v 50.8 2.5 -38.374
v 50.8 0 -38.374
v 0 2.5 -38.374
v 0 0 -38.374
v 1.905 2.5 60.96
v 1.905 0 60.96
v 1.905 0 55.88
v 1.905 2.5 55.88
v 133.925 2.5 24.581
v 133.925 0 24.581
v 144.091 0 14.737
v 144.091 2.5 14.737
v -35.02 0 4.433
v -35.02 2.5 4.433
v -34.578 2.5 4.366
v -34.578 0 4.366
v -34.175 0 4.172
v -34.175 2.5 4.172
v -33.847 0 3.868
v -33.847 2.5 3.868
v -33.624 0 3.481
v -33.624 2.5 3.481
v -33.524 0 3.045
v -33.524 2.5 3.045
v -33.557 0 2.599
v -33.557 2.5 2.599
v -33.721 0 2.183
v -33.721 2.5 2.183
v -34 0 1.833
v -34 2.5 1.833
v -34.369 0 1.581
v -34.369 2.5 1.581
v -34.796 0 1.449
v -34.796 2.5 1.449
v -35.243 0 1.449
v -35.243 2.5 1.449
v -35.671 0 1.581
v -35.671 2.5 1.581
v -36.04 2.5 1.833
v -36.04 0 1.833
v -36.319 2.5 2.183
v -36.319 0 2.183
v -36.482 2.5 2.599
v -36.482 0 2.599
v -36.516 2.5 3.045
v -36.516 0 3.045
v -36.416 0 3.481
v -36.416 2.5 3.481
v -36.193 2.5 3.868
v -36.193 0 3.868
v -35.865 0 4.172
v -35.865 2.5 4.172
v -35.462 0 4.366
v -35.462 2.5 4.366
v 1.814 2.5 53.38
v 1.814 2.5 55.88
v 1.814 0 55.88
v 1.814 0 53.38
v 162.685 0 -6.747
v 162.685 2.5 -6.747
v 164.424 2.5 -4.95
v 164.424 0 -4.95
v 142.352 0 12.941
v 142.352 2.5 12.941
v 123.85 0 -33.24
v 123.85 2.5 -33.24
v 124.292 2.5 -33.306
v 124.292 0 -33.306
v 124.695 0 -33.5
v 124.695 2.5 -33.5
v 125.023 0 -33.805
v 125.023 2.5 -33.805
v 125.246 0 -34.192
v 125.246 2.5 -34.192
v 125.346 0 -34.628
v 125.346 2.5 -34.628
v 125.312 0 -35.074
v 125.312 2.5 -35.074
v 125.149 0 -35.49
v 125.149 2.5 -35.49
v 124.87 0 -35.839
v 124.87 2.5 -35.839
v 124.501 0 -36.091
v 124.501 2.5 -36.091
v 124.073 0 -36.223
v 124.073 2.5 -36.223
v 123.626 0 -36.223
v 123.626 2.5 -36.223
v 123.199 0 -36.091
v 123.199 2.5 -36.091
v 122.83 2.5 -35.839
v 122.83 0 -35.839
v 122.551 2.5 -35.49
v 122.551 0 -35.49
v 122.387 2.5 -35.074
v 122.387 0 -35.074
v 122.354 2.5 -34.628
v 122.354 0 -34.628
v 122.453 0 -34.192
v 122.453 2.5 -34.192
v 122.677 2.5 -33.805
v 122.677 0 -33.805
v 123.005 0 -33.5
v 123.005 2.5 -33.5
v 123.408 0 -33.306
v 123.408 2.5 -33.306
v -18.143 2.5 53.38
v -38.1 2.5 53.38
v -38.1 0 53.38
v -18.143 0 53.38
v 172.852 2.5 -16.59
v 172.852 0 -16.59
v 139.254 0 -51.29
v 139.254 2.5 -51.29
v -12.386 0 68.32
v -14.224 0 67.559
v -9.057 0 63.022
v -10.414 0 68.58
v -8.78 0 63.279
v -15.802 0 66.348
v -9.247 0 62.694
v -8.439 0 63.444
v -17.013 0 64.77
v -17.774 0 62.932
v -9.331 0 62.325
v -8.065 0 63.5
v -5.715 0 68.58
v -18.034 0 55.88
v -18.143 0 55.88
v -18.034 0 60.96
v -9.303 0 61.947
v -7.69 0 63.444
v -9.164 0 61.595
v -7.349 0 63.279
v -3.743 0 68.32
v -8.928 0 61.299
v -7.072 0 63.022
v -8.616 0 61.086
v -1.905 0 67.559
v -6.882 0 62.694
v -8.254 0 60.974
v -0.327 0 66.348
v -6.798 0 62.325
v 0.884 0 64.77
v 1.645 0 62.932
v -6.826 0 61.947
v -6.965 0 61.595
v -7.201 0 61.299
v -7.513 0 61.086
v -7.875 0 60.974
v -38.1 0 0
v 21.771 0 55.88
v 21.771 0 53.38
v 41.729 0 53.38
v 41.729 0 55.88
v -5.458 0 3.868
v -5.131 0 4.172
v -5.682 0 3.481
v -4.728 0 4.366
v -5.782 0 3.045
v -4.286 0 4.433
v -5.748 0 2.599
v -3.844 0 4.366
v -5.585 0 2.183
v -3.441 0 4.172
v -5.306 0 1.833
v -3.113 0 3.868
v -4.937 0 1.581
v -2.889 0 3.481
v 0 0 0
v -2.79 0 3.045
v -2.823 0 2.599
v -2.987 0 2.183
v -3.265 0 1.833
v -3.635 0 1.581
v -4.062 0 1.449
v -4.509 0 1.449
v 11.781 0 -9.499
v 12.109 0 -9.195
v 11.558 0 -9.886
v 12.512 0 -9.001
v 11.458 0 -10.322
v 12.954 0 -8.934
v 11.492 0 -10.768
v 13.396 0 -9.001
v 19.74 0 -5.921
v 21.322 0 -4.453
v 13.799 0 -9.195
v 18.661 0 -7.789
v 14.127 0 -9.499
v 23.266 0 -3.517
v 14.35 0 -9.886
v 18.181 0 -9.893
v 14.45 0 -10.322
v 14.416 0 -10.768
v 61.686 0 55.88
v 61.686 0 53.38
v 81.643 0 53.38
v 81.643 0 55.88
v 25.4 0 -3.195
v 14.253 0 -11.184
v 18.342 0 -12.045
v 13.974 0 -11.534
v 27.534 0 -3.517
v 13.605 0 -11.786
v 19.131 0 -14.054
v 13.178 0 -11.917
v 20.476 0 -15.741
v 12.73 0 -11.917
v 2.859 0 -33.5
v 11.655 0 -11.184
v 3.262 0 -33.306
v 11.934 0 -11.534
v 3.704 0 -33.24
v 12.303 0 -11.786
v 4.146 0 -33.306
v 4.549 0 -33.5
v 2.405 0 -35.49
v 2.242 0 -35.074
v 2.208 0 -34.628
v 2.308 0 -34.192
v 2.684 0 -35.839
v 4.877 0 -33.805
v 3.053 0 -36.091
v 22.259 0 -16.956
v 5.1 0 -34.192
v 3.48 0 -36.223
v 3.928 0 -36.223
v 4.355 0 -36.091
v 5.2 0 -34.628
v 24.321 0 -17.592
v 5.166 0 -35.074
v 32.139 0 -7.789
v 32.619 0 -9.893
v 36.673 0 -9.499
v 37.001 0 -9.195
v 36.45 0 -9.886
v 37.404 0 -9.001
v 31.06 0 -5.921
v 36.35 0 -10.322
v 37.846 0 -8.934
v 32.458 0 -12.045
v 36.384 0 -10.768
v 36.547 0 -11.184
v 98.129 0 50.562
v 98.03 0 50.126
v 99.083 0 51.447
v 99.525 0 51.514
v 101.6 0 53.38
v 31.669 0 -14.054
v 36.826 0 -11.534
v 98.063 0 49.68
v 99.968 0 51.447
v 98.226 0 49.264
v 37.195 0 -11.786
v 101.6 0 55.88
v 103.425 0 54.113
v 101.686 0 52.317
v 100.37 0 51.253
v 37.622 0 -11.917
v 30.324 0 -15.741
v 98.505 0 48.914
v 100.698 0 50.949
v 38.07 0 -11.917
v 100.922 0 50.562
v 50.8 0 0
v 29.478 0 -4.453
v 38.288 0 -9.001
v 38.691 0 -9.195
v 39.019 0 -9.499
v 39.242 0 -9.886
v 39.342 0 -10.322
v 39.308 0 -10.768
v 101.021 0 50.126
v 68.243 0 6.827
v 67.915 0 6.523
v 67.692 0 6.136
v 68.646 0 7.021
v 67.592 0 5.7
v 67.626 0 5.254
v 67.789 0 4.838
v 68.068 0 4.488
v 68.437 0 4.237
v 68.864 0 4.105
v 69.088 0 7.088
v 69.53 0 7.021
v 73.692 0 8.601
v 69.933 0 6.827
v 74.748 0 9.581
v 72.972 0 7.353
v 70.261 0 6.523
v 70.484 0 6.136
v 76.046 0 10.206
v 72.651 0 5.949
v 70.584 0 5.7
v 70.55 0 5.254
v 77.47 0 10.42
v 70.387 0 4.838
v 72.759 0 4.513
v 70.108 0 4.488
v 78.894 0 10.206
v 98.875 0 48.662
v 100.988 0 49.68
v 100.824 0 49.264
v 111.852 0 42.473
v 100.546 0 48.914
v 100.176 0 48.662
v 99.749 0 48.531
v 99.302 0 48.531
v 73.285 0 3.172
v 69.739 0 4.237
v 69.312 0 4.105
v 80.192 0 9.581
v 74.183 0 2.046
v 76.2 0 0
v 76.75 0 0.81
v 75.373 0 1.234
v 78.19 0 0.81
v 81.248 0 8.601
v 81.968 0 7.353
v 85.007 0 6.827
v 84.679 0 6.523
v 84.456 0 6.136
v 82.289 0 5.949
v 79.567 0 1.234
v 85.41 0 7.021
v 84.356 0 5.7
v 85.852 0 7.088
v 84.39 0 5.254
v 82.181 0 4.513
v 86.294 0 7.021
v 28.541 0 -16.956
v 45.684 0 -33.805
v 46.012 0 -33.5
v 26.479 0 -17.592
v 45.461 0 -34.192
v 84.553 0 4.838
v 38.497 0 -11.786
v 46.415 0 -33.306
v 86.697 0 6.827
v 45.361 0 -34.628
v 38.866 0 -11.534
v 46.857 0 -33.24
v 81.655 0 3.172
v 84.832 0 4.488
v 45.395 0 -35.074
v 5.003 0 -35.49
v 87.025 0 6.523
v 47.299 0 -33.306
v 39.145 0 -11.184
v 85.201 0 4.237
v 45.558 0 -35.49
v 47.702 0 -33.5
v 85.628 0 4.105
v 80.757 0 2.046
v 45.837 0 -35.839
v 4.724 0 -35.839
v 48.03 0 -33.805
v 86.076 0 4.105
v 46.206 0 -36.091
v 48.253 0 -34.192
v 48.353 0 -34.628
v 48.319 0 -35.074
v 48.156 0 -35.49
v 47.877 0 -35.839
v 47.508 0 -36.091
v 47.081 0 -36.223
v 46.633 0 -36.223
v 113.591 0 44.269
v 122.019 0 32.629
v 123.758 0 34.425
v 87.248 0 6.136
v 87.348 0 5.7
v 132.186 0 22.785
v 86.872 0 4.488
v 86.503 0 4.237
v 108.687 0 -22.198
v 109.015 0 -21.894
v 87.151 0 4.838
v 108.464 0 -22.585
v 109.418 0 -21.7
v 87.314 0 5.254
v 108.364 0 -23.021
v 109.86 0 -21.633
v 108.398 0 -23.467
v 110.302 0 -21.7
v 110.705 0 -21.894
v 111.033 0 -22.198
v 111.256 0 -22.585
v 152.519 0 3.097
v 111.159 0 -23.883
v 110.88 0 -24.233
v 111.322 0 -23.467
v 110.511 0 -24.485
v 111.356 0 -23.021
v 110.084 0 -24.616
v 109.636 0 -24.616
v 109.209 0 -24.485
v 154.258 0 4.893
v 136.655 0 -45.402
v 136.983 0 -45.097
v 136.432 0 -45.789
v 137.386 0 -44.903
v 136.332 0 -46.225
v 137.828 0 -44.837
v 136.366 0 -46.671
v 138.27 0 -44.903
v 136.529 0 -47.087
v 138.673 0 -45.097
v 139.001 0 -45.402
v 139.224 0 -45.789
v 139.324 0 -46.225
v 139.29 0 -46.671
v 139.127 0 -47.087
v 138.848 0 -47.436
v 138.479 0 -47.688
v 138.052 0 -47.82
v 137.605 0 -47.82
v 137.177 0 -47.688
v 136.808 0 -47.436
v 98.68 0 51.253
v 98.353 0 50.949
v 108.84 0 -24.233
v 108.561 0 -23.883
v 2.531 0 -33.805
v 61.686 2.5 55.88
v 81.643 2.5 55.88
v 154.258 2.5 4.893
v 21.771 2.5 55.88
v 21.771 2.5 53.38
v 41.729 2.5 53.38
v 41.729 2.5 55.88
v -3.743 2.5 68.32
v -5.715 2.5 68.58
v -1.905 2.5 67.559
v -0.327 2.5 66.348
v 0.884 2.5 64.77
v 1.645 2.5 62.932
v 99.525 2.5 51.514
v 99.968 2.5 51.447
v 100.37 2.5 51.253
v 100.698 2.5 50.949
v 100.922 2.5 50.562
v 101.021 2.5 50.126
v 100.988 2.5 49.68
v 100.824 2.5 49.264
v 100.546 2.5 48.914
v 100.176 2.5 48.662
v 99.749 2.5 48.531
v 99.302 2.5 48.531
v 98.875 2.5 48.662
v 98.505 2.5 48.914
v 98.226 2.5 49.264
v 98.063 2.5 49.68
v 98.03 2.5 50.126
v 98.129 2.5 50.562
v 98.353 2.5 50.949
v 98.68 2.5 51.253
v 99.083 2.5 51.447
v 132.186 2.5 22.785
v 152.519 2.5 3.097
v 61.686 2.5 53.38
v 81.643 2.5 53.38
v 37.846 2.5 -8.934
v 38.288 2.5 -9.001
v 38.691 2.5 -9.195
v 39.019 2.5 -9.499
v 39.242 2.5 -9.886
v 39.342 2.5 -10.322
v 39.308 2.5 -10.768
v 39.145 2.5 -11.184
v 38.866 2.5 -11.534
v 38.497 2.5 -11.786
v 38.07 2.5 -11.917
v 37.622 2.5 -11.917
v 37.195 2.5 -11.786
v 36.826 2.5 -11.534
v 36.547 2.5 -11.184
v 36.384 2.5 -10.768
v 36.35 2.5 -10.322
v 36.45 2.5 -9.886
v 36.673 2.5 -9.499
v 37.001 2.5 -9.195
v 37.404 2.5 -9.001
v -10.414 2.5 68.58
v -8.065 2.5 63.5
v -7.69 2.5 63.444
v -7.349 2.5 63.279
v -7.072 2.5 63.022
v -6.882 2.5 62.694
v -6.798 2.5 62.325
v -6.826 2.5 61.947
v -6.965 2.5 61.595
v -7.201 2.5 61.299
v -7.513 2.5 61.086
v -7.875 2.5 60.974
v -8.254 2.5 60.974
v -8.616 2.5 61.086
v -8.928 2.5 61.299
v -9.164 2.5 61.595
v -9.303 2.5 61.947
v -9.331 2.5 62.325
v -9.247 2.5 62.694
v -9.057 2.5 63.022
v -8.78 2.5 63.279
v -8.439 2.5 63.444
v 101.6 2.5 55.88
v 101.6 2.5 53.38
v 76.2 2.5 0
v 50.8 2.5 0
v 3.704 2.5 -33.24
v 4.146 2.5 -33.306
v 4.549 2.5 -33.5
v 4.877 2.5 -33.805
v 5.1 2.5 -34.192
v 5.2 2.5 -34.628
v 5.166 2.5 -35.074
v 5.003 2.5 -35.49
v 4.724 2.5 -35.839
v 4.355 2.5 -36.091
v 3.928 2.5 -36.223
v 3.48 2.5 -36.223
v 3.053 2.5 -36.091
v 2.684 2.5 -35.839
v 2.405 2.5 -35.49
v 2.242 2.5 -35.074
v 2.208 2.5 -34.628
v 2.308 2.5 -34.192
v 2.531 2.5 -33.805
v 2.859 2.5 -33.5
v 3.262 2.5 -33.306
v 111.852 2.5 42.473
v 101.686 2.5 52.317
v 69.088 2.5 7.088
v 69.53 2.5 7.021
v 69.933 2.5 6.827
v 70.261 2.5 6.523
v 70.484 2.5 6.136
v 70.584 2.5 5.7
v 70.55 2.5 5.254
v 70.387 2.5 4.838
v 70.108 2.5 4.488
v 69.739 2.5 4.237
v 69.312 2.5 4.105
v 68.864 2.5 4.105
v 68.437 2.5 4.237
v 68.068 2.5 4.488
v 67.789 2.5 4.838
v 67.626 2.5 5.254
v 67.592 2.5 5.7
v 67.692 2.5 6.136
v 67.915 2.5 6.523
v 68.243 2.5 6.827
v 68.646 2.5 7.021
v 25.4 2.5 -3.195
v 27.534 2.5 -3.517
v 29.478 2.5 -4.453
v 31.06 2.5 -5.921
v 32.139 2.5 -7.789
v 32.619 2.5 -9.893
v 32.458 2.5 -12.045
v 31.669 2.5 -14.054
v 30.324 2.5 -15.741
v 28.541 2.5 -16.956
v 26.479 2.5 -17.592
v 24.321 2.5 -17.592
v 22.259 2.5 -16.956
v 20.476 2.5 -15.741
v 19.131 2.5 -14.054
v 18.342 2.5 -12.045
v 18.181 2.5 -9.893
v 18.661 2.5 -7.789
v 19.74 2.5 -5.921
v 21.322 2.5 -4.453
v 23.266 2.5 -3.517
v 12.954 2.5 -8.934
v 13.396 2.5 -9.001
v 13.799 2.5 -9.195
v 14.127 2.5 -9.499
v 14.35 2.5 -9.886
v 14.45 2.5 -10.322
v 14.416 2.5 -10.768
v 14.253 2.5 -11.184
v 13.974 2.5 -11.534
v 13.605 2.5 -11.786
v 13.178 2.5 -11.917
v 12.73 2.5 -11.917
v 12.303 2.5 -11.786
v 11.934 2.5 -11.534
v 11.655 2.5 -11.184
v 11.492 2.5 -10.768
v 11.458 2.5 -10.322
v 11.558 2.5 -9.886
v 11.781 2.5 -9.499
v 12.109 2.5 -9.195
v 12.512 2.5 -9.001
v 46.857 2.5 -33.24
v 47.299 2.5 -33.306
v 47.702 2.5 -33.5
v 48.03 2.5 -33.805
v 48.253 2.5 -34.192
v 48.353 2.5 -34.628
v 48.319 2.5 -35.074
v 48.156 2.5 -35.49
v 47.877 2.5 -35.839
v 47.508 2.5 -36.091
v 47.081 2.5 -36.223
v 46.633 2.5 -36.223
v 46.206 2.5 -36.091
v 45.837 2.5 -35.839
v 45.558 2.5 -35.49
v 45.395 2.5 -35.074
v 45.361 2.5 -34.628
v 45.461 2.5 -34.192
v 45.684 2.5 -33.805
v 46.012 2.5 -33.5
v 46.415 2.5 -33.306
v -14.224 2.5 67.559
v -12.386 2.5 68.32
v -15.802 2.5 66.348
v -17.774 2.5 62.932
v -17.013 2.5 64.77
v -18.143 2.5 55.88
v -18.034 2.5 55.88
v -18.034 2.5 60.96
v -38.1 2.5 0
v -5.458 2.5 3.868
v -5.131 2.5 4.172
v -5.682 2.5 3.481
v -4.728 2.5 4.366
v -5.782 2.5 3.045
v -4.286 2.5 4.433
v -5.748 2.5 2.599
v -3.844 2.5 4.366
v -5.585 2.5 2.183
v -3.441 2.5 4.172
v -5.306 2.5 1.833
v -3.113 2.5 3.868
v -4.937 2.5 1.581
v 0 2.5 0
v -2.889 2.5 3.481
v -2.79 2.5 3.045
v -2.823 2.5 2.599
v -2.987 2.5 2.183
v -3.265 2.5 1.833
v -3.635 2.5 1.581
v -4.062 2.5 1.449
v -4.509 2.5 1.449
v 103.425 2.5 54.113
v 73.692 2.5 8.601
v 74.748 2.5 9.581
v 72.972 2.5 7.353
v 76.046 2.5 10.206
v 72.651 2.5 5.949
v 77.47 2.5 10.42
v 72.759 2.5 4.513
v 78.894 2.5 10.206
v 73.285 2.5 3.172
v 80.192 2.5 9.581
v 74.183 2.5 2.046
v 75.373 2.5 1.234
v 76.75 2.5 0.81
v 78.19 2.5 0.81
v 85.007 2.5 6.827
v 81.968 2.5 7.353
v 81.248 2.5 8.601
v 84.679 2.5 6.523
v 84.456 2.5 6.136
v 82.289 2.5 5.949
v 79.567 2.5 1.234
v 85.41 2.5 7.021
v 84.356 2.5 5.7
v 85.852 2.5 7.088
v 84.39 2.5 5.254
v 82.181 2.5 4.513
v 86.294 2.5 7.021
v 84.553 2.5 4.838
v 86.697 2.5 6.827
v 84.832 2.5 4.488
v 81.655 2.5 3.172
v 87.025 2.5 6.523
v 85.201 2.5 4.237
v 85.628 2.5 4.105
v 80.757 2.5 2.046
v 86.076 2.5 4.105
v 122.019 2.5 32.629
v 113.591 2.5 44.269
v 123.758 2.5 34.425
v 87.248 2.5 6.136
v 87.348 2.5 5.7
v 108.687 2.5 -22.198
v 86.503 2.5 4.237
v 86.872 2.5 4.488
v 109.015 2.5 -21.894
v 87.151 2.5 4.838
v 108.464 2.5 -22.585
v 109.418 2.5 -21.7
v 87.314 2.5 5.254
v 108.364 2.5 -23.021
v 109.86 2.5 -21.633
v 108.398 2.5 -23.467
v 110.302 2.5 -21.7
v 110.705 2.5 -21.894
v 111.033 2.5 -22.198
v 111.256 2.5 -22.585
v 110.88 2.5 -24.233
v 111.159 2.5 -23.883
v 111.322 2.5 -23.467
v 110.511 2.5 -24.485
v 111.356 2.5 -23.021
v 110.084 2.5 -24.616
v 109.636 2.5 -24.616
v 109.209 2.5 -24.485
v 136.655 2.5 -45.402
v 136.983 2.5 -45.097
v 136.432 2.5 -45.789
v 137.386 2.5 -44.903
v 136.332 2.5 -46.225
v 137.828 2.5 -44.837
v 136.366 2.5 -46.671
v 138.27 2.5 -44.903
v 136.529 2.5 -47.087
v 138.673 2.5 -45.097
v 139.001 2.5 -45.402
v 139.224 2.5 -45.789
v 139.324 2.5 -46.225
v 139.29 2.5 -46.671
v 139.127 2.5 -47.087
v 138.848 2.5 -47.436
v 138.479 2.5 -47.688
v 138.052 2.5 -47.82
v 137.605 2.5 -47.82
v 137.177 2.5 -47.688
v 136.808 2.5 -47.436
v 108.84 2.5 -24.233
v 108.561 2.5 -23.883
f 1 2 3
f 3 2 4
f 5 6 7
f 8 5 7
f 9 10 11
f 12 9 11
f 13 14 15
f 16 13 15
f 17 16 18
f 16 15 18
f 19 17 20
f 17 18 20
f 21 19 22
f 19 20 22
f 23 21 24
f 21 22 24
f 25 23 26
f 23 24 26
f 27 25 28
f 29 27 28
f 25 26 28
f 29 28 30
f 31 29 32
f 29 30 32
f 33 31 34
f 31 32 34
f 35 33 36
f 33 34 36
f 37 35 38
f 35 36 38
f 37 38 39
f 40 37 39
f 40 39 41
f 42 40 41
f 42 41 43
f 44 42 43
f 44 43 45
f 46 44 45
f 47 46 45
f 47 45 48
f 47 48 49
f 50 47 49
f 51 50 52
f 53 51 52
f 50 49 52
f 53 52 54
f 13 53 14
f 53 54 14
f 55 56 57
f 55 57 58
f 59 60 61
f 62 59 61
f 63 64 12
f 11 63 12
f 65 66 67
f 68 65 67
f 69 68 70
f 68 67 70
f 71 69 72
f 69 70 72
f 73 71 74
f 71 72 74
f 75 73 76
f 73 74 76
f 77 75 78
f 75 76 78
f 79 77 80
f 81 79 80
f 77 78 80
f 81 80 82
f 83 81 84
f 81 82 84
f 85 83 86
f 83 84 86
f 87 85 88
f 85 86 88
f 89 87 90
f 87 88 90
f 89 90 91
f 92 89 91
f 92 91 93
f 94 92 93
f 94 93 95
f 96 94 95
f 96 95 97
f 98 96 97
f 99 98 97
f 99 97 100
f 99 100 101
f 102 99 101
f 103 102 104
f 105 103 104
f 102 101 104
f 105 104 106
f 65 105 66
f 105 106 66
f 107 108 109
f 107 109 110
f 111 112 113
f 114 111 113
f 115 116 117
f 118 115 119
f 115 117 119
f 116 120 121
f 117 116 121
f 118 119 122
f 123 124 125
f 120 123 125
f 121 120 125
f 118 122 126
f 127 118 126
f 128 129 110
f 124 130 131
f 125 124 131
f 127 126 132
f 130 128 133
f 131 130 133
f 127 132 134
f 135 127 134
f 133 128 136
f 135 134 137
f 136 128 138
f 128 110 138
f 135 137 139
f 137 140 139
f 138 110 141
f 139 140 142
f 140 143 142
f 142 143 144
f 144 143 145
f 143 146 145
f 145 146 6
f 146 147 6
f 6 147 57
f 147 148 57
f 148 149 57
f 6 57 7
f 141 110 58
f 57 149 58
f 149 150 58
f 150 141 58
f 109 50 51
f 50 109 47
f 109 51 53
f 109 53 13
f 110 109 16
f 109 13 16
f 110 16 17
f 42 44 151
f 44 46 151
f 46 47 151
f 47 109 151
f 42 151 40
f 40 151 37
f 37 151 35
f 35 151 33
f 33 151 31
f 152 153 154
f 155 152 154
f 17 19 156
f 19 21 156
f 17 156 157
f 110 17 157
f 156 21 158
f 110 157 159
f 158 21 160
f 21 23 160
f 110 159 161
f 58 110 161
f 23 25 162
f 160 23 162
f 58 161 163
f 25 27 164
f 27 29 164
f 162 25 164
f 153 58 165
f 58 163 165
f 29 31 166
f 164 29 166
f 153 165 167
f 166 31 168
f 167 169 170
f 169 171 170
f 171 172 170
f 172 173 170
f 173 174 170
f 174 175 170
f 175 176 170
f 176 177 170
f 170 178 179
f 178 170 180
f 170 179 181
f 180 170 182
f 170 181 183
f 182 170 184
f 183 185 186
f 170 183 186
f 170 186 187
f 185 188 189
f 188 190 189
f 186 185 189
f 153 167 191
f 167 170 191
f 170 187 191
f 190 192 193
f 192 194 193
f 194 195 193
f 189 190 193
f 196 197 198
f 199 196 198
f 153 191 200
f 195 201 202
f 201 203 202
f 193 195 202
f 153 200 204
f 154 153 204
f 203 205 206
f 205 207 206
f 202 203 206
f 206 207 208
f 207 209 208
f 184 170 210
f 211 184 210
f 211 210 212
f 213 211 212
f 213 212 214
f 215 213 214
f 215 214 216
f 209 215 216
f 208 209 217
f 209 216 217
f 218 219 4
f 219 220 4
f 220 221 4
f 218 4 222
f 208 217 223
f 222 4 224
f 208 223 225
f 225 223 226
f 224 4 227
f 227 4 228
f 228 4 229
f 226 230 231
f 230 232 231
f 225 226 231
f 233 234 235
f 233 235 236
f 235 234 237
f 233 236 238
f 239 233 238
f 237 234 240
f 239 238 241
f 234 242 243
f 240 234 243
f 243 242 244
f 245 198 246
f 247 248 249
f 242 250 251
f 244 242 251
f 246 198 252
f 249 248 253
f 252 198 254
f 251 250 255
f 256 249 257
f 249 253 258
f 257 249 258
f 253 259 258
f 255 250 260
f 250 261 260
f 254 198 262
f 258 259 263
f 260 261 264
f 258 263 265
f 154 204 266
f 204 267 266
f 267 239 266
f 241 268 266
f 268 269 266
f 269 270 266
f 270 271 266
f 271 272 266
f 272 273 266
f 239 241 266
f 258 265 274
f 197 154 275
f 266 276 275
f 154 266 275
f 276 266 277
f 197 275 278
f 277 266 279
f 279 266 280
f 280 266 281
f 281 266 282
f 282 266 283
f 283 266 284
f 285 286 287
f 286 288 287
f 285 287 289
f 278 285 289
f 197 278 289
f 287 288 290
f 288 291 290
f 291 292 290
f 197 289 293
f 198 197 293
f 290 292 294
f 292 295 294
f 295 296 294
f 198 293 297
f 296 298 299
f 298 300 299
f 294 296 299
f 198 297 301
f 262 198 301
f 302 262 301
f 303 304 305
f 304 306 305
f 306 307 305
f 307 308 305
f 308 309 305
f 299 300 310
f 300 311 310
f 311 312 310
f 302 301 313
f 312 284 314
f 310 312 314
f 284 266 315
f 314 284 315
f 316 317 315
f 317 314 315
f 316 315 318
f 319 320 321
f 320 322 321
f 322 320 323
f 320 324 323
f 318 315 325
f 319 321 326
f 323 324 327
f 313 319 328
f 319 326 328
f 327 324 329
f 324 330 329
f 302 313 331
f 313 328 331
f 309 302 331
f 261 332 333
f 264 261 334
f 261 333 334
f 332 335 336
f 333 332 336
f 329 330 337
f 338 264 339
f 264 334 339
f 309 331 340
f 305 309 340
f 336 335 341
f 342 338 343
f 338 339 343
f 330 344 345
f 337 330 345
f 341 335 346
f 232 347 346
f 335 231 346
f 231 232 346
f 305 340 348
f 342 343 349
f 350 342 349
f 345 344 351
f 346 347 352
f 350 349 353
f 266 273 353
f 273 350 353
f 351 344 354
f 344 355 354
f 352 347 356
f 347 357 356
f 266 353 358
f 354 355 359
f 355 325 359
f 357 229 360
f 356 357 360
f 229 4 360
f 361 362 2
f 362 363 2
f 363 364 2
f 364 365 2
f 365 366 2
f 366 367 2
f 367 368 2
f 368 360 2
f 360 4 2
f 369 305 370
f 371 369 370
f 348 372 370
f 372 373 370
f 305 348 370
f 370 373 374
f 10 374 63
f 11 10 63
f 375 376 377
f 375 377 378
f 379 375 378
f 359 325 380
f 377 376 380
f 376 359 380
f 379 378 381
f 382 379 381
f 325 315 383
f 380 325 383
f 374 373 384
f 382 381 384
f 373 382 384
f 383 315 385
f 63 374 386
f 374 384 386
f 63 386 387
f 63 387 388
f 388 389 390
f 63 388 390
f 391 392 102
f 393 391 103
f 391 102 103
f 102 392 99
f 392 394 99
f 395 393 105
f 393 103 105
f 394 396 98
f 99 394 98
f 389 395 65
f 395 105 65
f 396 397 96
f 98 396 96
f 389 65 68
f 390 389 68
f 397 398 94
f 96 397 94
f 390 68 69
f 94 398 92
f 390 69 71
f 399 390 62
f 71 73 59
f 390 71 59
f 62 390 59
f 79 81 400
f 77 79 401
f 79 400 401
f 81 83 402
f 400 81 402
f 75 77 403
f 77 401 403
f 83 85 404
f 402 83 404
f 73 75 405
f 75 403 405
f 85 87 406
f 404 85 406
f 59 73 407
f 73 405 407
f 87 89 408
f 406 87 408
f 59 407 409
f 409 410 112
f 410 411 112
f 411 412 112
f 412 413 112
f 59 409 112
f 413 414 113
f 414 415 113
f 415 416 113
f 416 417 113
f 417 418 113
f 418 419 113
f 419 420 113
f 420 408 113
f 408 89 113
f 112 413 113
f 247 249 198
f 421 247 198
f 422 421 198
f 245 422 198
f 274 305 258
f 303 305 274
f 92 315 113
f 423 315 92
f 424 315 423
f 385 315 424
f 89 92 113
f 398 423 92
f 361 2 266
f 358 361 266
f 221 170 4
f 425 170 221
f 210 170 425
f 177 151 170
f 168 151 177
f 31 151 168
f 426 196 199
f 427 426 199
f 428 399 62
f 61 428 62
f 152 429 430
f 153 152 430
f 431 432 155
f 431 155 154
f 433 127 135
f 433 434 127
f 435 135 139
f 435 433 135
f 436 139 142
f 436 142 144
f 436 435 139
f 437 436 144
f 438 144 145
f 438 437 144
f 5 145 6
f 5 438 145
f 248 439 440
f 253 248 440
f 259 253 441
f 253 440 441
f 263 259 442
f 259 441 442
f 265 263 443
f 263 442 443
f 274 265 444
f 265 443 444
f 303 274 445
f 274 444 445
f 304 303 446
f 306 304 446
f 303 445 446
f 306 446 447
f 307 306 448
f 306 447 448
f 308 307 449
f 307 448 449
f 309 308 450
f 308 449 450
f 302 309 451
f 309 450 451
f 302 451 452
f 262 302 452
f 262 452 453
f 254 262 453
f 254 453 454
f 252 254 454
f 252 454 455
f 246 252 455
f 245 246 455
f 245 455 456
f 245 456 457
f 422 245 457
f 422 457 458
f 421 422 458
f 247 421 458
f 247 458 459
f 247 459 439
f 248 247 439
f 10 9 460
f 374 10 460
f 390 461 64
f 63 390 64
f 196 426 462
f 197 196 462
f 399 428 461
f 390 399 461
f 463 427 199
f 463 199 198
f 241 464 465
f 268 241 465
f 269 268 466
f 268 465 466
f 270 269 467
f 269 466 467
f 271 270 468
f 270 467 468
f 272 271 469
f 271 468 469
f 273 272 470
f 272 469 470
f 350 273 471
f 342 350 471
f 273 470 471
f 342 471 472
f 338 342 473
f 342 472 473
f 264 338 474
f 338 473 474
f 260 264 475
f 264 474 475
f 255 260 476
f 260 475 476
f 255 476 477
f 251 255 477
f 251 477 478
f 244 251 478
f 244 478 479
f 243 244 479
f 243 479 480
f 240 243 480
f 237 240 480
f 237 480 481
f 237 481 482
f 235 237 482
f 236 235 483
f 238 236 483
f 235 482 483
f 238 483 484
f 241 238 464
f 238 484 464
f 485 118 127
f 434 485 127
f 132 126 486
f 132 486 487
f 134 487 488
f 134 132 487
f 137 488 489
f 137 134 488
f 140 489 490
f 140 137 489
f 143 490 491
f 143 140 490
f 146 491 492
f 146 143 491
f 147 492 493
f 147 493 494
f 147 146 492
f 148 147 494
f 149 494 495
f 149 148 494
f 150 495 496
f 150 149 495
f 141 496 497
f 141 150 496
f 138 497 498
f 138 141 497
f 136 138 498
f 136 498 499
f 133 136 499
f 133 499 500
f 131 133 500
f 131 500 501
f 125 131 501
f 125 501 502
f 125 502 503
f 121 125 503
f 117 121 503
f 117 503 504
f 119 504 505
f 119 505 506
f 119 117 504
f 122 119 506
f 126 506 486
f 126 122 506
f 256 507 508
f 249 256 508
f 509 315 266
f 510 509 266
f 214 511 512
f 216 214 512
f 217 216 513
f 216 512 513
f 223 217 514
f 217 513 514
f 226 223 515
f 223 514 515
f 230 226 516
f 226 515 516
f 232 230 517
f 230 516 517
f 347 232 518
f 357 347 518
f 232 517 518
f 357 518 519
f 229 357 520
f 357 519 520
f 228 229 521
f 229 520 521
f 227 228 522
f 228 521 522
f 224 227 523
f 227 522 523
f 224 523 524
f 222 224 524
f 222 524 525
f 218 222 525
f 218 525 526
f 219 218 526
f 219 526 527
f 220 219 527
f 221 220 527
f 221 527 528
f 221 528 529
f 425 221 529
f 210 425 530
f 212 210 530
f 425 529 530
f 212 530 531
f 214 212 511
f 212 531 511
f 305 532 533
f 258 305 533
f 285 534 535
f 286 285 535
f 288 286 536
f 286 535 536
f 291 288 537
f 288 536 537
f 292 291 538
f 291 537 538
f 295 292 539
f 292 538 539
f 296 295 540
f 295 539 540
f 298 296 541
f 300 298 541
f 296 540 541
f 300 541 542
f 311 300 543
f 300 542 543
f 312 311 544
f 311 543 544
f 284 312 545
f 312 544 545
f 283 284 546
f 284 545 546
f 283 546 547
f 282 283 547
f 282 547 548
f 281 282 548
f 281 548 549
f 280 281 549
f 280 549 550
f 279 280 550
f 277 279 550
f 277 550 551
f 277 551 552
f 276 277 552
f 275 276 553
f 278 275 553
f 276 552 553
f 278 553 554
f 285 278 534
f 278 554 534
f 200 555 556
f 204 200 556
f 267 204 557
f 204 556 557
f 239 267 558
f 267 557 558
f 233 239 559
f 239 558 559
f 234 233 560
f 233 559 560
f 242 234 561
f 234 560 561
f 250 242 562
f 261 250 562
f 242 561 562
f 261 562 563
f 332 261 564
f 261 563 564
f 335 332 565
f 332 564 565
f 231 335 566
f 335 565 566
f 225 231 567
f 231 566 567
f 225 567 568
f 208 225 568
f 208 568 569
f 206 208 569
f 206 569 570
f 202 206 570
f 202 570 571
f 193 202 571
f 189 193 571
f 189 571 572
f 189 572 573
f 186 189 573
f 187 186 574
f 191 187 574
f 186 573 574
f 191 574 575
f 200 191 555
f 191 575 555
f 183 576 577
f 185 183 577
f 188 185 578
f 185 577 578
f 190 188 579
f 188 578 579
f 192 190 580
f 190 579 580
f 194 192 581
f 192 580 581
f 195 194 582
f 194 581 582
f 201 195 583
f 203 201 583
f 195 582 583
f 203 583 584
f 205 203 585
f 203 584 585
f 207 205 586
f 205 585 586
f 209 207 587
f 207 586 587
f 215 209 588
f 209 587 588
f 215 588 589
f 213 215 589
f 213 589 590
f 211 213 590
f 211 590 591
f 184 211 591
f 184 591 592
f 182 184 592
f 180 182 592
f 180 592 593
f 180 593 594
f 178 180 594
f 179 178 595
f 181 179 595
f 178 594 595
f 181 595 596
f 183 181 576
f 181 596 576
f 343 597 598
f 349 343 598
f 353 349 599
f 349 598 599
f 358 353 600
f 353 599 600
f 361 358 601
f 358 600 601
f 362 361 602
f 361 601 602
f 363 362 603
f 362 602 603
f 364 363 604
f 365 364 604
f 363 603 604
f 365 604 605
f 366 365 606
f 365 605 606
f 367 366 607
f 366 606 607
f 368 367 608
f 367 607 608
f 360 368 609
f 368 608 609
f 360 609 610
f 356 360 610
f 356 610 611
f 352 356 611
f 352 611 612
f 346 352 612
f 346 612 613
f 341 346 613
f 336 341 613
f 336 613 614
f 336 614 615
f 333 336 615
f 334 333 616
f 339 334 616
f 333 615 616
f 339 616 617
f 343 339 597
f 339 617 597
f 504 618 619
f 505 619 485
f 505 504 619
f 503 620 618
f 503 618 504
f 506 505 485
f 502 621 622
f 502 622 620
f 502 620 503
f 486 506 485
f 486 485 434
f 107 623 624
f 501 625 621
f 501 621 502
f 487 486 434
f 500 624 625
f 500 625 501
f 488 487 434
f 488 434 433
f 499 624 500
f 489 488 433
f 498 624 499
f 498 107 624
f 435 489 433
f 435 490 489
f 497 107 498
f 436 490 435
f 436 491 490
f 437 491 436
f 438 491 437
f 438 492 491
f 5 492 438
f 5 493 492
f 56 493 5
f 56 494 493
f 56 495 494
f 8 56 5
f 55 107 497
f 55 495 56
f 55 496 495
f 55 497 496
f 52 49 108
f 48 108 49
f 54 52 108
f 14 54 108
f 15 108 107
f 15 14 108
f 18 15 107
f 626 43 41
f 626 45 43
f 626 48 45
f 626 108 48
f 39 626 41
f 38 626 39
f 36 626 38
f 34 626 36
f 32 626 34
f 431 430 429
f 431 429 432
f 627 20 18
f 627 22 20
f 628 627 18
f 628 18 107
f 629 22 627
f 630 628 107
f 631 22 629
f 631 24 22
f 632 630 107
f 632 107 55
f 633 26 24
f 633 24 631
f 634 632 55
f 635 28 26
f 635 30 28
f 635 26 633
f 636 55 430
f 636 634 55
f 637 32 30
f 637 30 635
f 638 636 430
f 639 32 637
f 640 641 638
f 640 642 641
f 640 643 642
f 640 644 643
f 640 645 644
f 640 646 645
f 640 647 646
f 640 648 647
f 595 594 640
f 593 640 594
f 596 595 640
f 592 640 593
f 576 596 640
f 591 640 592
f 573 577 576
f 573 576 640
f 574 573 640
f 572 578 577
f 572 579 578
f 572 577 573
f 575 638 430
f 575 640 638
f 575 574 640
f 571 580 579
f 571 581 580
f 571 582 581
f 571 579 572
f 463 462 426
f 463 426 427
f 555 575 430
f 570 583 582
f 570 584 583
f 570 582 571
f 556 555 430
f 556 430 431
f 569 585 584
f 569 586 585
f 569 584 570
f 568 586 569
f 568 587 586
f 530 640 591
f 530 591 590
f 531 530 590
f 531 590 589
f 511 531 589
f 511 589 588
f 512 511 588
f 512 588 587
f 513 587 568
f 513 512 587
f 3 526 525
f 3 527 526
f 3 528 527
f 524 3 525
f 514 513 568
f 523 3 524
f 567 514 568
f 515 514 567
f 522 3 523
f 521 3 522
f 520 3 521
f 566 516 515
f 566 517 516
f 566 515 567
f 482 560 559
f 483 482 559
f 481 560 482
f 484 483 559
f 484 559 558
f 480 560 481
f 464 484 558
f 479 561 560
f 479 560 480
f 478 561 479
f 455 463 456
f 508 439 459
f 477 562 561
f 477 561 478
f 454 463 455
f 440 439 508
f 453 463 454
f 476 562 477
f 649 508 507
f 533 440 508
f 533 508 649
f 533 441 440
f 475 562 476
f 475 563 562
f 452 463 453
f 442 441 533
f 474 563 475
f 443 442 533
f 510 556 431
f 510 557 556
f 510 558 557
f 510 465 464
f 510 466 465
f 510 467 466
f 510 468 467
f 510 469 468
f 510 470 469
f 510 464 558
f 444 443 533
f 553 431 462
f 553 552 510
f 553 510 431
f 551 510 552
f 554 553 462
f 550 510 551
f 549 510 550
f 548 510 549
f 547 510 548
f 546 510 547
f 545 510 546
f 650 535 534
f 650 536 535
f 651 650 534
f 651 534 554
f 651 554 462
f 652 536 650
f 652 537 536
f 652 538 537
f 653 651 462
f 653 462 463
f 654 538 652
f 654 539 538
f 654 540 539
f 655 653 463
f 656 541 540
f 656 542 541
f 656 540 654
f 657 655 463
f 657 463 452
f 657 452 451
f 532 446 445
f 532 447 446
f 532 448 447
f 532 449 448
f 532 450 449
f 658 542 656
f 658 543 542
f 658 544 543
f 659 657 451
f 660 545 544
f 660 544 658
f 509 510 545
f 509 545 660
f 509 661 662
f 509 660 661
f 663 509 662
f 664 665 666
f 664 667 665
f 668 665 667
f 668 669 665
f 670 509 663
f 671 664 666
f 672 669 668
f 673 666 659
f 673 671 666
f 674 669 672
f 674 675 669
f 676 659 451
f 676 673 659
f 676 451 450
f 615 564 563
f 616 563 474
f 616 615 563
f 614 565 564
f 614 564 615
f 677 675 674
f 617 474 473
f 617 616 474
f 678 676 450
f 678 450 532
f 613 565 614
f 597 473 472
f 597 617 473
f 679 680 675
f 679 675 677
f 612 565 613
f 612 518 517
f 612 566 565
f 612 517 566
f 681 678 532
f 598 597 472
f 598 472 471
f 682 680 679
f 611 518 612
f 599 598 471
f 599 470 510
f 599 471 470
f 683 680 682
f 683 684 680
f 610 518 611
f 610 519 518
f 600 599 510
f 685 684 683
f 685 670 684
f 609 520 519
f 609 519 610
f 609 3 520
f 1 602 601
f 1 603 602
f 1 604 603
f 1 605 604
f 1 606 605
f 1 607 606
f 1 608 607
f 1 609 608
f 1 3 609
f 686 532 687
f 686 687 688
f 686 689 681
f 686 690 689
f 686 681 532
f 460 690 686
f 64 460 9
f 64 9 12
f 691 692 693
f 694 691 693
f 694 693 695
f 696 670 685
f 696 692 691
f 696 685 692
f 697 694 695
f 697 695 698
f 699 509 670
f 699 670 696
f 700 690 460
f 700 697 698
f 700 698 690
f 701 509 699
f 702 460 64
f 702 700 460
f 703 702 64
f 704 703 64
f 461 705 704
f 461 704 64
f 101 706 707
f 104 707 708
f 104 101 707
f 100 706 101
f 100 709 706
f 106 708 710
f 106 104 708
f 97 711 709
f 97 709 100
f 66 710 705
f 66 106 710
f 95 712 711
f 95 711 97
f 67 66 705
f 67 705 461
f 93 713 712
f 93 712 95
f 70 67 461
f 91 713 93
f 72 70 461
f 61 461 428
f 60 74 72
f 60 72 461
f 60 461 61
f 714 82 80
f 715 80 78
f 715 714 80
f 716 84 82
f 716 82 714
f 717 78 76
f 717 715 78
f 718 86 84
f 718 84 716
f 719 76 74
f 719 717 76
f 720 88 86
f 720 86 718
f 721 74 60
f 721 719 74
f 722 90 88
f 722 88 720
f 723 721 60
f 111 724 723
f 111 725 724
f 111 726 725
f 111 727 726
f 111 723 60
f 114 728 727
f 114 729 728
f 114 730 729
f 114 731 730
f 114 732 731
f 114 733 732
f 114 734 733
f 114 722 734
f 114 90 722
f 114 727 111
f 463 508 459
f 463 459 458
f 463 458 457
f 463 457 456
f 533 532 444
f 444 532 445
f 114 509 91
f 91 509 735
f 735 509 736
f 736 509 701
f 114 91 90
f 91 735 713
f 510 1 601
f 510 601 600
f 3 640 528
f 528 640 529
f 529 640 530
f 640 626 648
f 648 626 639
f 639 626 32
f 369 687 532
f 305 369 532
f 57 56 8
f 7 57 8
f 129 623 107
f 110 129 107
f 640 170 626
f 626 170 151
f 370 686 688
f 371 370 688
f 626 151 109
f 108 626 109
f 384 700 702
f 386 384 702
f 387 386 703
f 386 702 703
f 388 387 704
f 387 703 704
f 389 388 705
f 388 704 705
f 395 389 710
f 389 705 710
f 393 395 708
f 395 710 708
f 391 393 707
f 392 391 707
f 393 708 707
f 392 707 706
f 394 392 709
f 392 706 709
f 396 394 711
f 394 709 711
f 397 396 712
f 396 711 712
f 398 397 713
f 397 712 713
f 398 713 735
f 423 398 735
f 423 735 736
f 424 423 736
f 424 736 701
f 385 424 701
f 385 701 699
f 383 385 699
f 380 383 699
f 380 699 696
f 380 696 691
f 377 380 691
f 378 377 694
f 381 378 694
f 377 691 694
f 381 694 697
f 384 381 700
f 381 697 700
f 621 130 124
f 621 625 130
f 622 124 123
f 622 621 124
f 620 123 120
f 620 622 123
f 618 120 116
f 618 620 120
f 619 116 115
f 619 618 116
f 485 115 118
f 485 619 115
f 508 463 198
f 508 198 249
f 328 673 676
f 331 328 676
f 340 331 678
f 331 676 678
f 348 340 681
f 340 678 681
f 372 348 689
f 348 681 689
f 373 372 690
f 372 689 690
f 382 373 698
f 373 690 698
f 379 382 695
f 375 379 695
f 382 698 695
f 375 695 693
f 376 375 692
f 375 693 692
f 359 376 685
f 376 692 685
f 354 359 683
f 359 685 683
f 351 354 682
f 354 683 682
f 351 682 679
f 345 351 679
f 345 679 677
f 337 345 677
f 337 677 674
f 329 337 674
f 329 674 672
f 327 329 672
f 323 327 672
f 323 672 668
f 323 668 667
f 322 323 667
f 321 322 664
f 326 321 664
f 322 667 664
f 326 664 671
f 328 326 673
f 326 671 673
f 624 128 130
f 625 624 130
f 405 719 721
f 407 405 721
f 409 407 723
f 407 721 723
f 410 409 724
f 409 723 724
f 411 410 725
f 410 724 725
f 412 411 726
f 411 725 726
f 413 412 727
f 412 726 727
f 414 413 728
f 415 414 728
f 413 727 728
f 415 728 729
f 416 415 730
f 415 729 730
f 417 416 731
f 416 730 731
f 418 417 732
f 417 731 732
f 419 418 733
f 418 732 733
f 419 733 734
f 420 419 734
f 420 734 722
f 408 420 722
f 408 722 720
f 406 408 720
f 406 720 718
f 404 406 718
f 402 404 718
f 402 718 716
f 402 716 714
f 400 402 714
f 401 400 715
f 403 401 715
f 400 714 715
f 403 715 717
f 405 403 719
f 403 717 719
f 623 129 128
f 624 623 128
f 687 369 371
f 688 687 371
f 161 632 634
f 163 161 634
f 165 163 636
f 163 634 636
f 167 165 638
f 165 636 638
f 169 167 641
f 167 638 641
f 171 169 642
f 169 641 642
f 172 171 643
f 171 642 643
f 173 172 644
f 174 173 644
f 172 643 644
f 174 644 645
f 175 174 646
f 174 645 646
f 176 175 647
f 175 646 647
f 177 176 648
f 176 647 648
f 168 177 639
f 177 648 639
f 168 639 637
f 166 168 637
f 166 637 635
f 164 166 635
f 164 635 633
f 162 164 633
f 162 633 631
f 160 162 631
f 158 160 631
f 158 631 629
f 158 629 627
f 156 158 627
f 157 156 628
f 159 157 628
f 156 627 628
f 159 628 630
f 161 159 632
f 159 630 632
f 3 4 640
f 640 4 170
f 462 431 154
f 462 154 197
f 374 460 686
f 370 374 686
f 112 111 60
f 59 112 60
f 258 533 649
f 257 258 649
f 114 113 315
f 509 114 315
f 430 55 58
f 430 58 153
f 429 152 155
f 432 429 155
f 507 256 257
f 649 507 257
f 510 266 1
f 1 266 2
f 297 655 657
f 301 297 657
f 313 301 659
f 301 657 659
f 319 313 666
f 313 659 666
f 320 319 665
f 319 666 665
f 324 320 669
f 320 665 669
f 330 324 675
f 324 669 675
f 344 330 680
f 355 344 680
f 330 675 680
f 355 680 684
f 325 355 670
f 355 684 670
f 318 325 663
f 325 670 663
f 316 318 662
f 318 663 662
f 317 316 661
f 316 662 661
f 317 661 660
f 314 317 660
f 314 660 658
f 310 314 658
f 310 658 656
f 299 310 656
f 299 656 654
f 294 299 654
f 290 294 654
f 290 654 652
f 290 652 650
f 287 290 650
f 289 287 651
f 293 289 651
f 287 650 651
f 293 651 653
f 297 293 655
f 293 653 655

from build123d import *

# Parameters (mm, degrees)
SKETCH1_R           = 1.27
BOSS_EXTRUDE1_DEPTH = 2.5
SKETCH2_W           = 19.957142857
SKETCH2_H           = 2.5
CUT_EXTRUDE1_DEPTH  = 2.5
CUT_EXTRUDE2_DEPTH  = 2.5
SKETCH4_R           = 1.5
CUT_EXTRUDE3_DEPTH  = 2.5
SKETCH5_R           = 7.239
SKETCH5_R_2         = 1.5
CUT_EXTRUDE4_DEPTH  = 2.5
SKETCH6_R           = 4.83219682
SKETCH6_R_2         = 1.5
CUT_EXTRUDE5_DEPTH  = 2.5
SKETCH7_R           = 1.5
CUT_EXTRUDE6_DEPTH  = 2.54
FILLET1_R           = 7.62


with BuildPart() as part:
    # Sketch1 → Boss-Extrude1 (new body)
    with BuildSketch(Plane(origin=(0, 0, 0), x_dir=(1, 0, 0), z_dir=(0, 1, 0))):
        Polygon((0, 0), (-38.1, 0), (-38.1, -55.88), (-18.034, -55.88), (-18.034, -68.58), (1.905, -68.58), (1.905, -55.88), (101.6, -55.88), (174.591014612, 14.794406866), (139.253811179, 51.289914172), (76.2, 0), (50.8, 0), (50.8, 38.374100719), (0, 38.374100719), align=None)
        with Locations(Location((-8.0645, -62.23, 0), (0, 0, 270))):
            Circle(SKETCH1_R, mode=Mode.SUBTRACT)
    extrude(amount=BOSS_EXTRUDE1_DEPTH)

    # Sketch2 → Cut-Extrude1 (cut)
    with BuildSketch(Plane(origin=(0, 2.5, 0), x_dir=(1, 0, 0), z_dir=(0, 1, 0))):
        with Locations((-28.121428572, -54.63)):
            Rectangle(SKETCH2_W, SKETCH2_H)
        with Locations((11.792857143, -54.63)):
            Rectangle(SKETCH2_W, SKETCH2_H)
        with Locations((51.707142858, -54.63)):
            Rectangle(SKETCH2_W, SKETCH2_H)
        with Locations((91.621428572, -54.63)):
            Rectangle(SKETCH2_W, SKETCH2_H)
    extrude(amount=-CUT_EXTRUDE1_DEPTH, mode=Mode.SUBTRACT)

    # Sketch3 → Cut-Extrude2 (cut)
    with BuildSketch(Plane(origin=(0, 2.5, 0), x_dir=(1, 0, 0), z_dir=(0, 1, 0))):
        Polygon((101.685739763, -52.317101083), (103.424775365, -54.113139828), (113.591380972, -44.269204586), (111.85234537, -42.473165841), align=None)
        Polygon((122.018950977, -32.629230599), (123.757986579, -34.425269344), (133.924592185, -24.581334102), (132.185556583, -22.785295357), align=None)
        Polygon((142.35216219, -12.941360115), (144.091197792, -14.73739886), (154.257803399, -4.893463618), (152.518767797, -3.097424873), align=None)
        Polygon((162.685373403, 6.74651037), (164.424409005, 4.950471624), (174.591014612, 14.794406866), (172.85197901, 16.590445612), align=None)
    extrude(amount=-CUT_EXTRUDE2_DEPTH, mode=Mode.SUBTRACT)

    # Sketch4 → Cut-Extrude3 (cut)
    with BuildSketch(Plane(origin=(0, 2.5, 0), x_dir=(1, 0, 0), z_dir=(0, 1, 0))):
        with Locations(Location((-4.285702379, -2.932700938, 0), (0, 0, 270))):
            Circle(SKETCH4_R)
        with Locations(Location((-35.019835528, -2.932700938, 0), (0, 0, 270))):
            Circle(SKETCH4_R)
        with Locations(Location((3.703940689, 34.739752907, 0), (0, 0, 270))):
            Circle(SKETCH4_R)
        with Locations(Location((46.856938601, 34.739752907, 0), (0, 0, 270))):
            Circle(SKETCH4_R)
        with Locations(Location((137.828101929, 46.33680801, 0), (0, 0, 270))):
            Circle(SKETCH4_R)
        with Locations(Location((109.860015666, 23.133232504, 0), (0, 0, 270))):
            Circle(SKETCH4_R)
        with Locations(Location((123.849763227, 34.739752907, 0), (0, 0, 270))):
            Circle(SKETCH4_R)
    extrude(amount=-CUT_EXTRUDE3_DEPTH, mode=Mode.SUBTRACT)

    # Sketch5 → Cut-Extrude4 (cut)
    with BuildSketch(Plane(origin=(0, 2.5, 0), x_dir=(1, 0, 0), z_dir=(0, 1, 0))):
        with Locations(Location((25.4, 10.434100719, 0), (0, 0, 270))):
            Circle(SKETCH5_R)
        with Locations(Location((12.954, 10.434100719, 0), (0, 0, 270))):
            Circle(SKETCH5_R_2)
        with Locations(Location((37.846, 10.434100719, 0), (0, 0, 270))):
            Circle(SKETCH5_R_2)
    extrude(amount=-CUT_EXTRUDE4_DEPTH, mode=Mode.SUBTRACT)

    # Sketch6 → Cut-Extrude5 (cut)
    with BuildSketch(Plane(origin=(0, 2.5, 0), x_dir=(1, 0, 0), z_dir=(0, 1, 0))):
        with Locations(Location((77.47, -5.588, 0), (0, 0, 270))):
            Circle(SKETCH6_R)
        with Locations(Location((69.088, -5.588, 0), (0, 0, 270))):
            Circle(SKETCH6_R_2)
        with Locations(Location((85.852, -5.588, 0), (0, 0, 270))):
            Circle(SKETCH6_R_2)
    extrude(amount=-CUT_EXTRUDE5_DEPTH, mode=Mode.SUBTRACT)

    # Sketch7 → Cut-Extrude6 (cut)
    with BuildSketch(Plane(origin=(0, 2.5, 0), x_dir=(1, 0, 0), z_dir=(0, 1, 0))):
        with Locations(Location((99.525450368, -50.013841017, 0), (0, 0, 270))):
            Circle(SKETCH7_R)
    extrude(amount=-CUT_EXTRUDE6_DEPTH, mode=Mode.SUBTRACT)

    # Fillet1
    fillet1_edges = [part.edges().sort_by_distance(p)[0] for p in [
        (1.905, 1.25, 68.58),
        (-18.034, 1.25, 68.58),
    ]]
    fillet(fillet1_edges, radius=FILLET1_R)


solid = part.part
